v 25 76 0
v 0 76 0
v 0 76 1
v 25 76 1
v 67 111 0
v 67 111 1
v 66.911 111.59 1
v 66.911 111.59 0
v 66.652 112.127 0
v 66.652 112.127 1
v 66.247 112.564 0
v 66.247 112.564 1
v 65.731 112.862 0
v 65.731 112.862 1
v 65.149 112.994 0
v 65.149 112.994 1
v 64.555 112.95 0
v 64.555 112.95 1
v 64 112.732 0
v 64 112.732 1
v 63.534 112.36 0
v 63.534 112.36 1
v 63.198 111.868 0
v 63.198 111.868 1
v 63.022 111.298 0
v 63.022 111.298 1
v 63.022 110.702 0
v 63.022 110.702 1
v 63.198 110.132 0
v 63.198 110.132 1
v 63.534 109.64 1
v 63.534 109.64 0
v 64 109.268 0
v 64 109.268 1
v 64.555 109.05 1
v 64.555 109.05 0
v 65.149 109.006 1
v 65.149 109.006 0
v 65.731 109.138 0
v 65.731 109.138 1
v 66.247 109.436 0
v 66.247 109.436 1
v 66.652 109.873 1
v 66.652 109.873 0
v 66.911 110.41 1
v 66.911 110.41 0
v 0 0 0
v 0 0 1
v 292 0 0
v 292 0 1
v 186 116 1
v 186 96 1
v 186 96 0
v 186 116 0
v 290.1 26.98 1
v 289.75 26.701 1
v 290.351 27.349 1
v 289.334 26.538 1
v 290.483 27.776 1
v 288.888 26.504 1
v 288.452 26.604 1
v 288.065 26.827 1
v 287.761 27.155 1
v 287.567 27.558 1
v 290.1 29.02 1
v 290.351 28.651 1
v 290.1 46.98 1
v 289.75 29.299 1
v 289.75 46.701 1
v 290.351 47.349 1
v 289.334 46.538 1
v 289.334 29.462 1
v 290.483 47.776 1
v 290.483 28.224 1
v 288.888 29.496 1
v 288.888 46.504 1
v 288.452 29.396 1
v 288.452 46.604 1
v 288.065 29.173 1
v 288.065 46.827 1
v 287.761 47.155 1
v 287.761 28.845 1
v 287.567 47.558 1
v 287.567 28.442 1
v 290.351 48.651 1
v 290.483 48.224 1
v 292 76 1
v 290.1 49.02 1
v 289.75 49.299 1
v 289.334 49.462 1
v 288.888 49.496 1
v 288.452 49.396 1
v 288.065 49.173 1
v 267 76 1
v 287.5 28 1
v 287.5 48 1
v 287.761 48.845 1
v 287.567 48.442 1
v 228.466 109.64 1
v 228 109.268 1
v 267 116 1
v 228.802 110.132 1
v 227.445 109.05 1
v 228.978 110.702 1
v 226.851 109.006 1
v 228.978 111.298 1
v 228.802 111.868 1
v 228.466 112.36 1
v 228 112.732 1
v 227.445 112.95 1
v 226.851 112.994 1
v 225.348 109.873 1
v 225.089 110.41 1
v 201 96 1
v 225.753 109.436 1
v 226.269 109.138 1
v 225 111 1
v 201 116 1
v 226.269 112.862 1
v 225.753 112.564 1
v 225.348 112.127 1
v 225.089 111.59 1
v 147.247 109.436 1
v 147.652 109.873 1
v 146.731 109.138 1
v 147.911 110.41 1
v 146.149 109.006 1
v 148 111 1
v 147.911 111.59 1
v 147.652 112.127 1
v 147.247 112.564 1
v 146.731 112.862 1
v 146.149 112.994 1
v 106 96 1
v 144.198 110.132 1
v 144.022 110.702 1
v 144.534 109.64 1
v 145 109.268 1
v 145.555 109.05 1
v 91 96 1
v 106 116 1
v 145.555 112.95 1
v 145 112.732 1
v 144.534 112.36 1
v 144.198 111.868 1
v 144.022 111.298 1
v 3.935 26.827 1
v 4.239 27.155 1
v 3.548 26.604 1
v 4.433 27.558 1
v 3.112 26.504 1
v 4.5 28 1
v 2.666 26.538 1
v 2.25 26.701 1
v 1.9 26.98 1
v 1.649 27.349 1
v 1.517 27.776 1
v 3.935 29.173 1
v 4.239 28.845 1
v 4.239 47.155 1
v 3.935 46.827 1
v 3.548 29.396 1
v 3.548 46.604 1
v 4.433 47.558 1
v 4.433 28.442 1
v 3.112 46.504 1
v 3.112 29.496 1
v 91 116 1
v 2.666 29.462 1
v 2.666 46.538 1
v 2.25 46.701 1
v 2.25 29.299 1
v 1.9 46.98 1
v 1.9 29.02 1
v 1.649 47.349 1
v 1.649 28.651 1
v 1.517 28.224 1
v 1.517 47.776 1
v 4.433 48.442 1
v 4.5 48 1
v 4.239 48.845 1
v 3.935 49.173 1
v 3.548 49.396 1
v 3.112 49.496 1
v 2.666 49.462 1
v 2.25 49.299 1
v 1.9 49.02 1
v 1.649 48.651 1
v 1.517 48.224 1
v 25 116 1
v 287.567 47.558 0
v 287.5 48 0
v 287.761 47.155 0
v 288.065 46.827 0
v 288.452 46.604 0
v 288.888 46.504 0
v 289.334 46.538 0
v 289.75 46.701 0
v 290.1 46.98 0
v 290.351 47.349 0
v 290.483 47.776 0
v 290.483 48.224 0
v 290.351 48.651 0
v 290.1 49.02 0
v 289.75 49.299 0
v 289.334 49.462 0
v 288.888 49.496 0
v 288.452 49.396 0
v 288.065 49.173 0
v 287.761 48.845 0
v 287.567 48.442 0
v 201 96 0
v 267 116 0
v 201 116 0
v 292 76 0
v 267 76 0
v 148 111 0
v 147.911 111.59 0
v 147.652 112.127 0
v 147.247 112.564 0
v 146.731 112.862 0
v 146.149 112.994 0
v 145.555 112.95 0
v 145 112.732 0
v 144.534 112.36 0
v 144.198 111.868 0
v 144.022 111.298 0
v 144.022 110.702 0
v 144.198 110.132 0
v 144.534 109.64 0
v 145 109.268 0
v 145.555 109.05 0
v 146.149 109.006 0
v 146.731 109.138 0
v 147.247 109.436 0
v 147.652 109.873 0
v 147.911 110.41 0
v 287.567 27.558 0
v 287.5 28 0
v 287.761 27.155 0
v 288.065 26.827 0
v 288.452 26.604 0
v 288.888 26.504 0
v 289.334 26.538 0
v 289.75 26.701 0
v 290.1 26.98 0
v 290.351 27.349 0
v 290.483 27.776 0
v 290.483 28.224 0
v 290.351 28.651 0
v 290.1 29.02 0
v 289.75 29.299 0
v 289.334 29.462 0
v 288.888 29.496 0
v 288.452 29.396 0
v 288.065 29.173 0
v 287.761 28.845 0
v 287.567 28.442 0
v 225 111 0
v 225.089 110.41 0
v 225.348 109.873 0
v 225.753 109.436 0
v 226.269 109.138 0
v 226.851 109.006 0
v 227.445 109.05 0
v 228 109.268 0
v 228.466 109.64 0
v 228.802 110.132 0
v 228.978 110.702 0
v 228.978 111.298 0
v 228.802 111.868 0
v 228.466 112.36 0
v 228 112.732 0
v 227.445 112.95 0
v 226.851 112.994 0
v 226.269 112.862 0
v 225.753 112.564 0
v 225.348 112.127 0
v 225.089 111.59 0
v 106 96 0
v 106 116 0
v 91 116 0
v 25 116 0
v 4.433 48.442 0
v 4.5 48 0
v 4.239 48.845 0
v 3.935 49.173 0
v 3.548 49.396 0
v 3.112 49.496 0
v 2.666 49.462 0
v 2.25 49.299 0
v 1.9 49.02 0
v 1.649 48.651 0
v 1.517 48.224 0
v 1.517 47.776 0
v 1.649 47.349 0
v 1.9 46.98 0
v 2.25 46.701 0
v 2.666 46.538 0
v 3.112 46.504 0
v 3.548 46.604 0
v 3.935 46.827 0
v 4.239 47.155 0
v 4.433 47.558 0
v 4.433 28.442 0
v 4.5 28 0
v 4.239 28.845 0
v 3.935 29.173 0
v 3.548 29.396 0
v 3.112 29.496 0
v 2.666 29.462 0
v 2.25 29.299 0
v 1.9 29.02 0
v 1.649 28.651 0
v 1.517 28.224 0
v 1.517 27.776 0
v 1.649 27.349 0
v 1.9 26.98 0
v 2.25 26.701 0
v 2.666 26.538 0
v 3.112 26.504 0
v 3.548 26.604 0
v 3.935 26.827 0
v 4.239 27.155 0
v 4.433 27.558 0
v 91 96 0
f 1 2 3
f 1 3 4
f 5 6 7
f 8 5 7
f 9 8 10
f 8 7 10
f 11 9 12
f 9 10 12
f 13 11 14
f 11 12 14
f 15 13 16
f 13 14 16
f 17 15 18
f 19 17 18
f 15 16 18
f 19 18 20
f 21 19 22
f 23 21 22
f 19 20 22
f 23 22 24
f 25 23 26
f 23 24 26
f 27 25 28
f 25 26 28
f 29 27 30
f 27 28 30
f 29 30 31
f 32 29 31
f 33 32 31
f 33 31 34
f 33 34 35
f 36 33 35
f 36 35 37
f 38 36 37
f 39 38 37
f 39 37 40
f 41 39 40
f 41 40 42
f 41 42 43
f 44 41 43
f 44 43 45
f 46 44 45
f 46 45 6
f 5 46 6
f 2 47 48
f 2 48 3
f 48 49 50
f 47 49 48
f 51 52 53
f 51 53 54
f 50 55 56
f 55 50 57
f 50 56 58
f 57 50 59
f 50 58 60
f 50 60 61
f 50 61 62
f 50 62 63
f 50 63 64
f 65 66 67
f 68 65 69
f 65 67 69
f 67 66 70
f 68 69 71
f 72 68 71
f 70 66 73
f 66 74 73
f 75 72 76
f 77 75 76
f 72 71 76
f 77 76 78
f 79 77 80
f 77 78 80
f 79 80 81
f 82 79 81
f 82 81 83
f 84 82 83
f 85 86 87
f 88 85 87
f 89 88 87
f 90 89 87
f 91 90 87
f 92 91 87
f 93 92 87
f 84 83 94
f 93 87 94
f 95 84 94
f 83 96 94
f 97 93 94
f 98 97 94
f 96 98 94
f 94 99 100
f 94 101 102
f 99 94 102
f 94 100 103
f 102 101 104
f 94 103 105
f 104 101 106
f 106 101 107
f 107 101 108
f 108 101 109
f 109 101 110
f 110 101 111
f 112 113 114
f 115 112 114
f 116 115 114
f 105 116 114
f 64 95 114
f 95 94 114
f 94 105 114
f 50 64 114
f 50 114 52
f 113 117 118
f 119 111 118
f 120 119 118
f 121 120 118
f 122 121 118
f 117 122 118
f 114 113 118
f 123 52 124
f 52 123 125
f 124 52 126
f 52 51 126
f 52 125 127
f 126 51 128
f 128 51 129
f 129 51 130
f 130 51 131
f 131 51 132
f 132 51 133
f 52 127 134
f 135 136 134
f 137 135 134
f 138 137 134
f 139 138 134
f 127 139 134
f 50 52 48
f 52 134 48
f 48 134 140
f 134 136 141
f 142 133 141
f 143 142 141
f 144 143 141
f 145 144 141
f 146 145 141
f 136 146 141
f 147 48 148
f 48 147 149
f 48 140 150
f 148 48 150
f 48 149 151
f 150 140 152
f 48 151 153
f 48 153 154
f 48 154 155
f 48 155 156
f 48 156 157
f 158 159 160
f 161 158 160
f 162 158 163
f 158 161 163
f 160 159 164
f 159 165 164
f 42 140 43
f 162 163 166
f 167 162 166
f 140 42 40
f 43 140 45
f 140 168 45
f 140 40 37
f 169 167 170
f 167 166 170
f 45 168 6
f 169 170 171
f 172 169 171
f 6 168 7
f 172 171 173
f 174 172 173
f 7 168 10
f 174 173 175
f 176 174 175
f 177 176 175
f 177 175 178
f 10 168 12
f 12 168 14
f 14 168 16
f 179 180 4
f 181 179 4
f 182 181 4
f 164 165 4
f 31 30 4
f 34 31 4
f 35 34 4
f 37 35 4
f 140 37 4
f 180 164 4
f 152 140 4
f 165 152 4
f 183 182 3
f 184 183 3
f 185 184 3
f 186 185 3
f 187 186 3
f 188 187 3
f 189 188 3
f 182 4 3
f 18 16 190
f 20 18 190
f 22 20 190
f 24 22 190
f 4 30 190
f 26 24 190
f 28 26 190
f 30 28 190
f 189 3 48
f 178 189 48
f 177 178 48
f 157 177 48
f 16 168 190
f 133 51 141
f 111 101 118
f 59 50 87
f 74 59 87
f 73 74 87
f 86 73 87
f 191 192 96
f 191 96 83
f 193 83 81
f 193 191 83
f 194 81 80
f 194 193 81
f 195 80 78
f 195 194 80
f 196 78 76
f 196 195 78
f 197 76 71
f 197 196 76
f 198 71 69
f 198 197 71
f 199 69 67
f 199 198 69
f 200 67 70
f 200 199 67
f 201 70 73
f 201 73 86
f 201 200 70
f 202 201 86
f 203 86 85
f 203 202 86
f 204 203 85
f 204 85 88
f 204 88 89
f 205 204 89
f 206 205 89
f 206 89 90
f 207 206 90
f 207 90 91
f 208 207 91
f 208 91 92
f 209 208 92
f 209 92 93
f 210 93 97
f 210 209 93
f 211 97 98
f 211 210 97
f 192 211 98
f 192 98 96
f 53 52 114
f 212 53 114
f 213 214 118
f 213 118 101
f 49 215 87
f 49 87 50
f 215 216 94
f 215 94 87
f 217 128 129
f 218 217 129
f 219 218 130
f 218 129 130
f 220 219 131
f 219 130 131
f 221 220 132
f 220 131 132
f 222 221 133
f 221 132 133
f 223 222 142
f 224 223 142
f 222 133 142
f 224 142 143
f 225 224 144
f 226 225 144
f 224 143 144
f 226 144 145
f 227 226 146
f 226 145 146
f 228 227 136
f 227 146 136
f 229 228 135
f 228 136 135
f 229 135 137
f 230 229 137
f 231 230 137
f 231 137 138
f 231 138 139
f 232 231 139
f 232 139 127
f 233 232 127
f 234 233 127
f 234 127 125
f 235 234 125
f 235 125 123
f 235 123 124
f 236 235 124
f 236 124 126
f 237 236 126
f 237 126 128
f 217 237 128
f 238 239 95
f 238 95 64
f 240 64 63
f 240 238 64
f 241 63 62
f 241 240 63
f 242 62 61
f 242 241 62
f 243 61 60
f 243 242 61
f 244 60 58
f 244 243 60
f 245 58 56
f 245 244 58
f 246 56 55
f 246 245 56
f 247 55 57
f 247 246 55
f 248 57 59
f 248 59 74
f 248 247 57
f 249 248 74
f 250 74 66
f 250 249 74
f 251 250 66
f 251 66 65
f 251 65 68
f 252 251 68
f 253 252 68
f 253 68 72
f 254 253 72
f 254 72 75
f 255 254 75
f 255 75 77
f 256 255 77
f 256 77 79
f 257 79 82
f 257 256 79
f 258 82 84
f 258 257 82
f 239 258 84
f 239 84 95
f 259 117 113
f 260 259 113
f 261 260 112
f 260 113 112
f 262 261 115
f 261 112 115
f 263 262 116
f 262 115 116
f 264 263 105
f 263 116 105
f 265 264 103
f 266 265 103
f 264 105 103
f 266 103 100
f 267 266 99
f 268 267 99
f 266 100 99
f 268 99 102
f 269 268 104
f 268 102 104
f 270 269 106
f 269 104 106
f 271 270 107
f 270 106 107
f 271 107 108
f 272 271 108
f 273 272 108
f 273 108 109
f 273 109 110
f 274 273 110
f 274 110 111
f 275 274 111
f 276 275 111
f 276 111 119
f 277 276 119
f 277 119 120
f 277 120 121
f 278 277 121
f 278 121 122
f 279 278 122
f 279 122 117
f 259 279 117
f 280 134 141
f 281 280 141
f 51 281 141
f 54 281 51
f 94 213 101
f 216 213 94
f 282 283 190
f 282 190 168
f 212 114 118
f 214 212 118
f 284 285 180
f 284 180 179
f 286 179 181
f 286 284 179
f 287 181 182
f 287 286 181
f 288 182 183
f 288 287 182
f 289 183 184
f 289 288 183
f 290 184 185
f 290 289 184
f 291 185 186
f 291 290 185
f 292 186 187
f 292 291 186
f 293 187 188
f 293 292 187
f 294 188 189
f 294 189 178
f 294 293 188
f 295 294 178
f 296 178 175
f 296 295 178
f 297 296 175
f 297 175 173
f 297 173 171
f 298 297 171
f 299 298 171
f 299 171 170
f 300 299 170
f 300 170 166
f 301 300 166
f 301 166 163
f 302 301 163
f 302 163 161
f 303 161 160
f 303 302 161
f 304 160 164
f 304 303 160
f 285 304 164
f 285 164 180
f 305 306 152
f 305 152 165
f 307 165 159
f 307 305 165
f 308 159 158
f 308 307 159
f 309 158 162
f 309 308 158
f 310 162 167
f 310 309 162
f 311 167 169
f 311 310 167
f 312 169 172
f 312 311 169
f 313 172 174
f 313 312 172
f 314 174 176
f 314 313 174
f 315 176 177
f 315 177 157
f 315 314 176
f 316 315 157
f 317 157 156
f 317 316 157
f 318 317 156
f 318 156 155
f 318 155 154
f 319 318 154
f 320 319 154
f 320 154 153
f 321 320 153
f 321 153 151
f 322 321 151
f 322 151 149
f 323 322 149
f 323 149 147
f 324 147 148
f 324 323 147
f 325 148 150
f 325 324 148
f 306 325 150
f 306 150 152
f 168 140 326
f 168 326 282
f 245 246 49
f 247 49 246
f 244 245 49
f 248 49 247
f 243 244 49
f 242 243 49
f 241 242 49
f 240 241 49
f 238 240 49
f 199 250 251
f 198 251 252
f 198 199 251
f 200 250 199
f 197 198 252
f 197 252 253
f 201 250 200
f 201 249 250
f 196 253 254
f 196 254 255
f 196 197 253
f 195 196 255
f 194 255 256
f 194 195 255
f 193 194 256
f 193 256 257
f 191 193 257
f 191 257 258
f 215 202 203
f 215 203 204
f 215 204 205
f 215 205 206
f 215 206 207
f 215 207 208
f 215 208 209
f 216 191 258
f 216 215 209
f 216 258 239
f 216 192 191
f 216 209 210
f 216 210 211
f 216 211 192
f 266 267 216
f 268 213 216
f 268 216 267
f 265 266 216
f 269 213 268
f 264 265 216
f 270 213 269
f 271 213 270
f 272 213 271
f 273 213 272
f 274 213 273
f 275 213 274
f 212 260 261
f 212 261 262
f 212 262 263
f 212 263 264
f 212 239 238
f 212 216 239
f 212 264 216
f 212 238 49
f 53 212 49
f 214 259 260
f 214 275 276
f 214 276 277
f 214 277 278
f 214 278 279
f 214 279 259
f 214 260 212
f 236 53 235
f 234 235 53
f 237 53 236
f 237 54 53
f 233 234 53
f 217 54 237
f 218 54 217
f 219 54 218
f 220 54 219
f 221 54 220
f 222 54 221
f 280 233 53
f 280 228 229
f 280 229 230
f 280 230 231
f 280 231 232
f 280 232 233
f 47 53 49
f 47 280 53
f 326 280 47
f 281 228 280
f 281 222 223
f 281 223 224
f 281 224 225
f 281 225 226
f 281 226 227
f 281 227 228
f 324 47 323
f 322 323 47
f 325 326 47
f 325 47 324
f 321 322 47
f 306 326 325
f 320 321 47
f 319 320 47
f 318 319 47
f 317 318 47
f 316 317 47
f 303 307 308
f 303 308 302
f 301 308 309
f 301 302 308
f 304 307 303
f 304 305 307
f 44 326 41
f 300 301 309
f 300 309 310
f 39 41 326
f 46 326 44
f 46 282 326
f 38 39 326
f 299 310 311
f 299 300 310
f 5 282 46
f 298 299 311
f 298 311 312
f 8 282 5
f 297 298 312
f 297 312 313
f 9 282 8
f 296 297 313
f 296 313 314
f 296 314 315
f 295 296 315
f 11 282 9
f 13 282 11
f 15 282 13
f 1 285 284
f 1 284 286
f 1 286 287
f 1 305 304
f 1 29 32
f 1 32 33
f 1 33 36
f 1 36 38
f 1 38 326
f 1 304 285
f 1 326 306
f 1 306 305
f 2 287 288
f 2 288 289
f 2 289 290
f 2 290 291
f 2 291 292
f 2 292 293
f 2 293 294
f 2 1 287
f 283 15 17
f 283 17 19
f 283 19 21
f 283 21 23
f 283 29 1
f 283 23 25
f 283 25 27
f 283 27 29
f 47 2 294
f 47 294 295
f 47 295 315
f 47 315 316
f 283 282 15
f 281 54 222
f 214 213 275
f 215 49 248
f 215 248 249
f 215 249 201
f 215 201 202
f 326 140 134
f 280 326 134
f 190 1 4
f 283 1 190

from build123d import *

# Parameters (mm, degrees)
SKETCH_1_R          = 1.5
EXTRUDE_1_DEPTH     = 1
SKETCH_2_R          = 2
SKETCH_2_W          = 15
SKETCH_2_H          = 20
CUT_EXTRUDE_1_DEPTH = 315.198981539


with BuildPart() as part:
    # 草图1 → 凸台-拉伸1 (new body)
    with BuildSketch(Plane.XY):
        Polygon((0, 0), (0, 76), (25, 76), (25, 116), (267, 116), (267, 76), (292, 76), (292, 0), align=None)
        with Locations((3, 48)):
            Circle(SKETCH_1_R, mode=Mode.SUBTRACT)
        with Locations((3, 28)):
            Circle(SKETCH_1_R, mode=Mode.SUBTRACT)
        with Locations(Location((289, 28, 0), (0, 0, 180))):
            Circle(SKETCH_1_R, mode=Mode.SUBTRACT)
        with Locations(Location((289, 48, 0), (0, 0, 180))):
            Circle(SKETCH_1_R, mode=Mode.SUBTRACT)
    extrude(amount=EXTRUDE_1_DEPTH)

    # 草图2 → 切除-拉伸1 (cut, through all)
    with BuildSketch(Plane.XY.offset(1)):
        with Locations((65, 111)):
            Circle(SKETCH_2_R)
        with Locations(Location((227, 111, 0), (0, 0, 180))):
            Circle(SKETCH_2_R)
        with Locations((146, 111)):
            Circle(SKETCH_2_R)
        with Locations((193.5, 106)):
            Rectangle(SKETCH_2_W, SKETCH_2_H)
        with Locations((98.5, 106)):
            Rectangle(SKETCH_2_W, SKETCH_2_H)
    extrude(amount=-CUT_EXTRUDE_1_DEPTH, mode=Mode.SUBTRACT)


solid = part.part
